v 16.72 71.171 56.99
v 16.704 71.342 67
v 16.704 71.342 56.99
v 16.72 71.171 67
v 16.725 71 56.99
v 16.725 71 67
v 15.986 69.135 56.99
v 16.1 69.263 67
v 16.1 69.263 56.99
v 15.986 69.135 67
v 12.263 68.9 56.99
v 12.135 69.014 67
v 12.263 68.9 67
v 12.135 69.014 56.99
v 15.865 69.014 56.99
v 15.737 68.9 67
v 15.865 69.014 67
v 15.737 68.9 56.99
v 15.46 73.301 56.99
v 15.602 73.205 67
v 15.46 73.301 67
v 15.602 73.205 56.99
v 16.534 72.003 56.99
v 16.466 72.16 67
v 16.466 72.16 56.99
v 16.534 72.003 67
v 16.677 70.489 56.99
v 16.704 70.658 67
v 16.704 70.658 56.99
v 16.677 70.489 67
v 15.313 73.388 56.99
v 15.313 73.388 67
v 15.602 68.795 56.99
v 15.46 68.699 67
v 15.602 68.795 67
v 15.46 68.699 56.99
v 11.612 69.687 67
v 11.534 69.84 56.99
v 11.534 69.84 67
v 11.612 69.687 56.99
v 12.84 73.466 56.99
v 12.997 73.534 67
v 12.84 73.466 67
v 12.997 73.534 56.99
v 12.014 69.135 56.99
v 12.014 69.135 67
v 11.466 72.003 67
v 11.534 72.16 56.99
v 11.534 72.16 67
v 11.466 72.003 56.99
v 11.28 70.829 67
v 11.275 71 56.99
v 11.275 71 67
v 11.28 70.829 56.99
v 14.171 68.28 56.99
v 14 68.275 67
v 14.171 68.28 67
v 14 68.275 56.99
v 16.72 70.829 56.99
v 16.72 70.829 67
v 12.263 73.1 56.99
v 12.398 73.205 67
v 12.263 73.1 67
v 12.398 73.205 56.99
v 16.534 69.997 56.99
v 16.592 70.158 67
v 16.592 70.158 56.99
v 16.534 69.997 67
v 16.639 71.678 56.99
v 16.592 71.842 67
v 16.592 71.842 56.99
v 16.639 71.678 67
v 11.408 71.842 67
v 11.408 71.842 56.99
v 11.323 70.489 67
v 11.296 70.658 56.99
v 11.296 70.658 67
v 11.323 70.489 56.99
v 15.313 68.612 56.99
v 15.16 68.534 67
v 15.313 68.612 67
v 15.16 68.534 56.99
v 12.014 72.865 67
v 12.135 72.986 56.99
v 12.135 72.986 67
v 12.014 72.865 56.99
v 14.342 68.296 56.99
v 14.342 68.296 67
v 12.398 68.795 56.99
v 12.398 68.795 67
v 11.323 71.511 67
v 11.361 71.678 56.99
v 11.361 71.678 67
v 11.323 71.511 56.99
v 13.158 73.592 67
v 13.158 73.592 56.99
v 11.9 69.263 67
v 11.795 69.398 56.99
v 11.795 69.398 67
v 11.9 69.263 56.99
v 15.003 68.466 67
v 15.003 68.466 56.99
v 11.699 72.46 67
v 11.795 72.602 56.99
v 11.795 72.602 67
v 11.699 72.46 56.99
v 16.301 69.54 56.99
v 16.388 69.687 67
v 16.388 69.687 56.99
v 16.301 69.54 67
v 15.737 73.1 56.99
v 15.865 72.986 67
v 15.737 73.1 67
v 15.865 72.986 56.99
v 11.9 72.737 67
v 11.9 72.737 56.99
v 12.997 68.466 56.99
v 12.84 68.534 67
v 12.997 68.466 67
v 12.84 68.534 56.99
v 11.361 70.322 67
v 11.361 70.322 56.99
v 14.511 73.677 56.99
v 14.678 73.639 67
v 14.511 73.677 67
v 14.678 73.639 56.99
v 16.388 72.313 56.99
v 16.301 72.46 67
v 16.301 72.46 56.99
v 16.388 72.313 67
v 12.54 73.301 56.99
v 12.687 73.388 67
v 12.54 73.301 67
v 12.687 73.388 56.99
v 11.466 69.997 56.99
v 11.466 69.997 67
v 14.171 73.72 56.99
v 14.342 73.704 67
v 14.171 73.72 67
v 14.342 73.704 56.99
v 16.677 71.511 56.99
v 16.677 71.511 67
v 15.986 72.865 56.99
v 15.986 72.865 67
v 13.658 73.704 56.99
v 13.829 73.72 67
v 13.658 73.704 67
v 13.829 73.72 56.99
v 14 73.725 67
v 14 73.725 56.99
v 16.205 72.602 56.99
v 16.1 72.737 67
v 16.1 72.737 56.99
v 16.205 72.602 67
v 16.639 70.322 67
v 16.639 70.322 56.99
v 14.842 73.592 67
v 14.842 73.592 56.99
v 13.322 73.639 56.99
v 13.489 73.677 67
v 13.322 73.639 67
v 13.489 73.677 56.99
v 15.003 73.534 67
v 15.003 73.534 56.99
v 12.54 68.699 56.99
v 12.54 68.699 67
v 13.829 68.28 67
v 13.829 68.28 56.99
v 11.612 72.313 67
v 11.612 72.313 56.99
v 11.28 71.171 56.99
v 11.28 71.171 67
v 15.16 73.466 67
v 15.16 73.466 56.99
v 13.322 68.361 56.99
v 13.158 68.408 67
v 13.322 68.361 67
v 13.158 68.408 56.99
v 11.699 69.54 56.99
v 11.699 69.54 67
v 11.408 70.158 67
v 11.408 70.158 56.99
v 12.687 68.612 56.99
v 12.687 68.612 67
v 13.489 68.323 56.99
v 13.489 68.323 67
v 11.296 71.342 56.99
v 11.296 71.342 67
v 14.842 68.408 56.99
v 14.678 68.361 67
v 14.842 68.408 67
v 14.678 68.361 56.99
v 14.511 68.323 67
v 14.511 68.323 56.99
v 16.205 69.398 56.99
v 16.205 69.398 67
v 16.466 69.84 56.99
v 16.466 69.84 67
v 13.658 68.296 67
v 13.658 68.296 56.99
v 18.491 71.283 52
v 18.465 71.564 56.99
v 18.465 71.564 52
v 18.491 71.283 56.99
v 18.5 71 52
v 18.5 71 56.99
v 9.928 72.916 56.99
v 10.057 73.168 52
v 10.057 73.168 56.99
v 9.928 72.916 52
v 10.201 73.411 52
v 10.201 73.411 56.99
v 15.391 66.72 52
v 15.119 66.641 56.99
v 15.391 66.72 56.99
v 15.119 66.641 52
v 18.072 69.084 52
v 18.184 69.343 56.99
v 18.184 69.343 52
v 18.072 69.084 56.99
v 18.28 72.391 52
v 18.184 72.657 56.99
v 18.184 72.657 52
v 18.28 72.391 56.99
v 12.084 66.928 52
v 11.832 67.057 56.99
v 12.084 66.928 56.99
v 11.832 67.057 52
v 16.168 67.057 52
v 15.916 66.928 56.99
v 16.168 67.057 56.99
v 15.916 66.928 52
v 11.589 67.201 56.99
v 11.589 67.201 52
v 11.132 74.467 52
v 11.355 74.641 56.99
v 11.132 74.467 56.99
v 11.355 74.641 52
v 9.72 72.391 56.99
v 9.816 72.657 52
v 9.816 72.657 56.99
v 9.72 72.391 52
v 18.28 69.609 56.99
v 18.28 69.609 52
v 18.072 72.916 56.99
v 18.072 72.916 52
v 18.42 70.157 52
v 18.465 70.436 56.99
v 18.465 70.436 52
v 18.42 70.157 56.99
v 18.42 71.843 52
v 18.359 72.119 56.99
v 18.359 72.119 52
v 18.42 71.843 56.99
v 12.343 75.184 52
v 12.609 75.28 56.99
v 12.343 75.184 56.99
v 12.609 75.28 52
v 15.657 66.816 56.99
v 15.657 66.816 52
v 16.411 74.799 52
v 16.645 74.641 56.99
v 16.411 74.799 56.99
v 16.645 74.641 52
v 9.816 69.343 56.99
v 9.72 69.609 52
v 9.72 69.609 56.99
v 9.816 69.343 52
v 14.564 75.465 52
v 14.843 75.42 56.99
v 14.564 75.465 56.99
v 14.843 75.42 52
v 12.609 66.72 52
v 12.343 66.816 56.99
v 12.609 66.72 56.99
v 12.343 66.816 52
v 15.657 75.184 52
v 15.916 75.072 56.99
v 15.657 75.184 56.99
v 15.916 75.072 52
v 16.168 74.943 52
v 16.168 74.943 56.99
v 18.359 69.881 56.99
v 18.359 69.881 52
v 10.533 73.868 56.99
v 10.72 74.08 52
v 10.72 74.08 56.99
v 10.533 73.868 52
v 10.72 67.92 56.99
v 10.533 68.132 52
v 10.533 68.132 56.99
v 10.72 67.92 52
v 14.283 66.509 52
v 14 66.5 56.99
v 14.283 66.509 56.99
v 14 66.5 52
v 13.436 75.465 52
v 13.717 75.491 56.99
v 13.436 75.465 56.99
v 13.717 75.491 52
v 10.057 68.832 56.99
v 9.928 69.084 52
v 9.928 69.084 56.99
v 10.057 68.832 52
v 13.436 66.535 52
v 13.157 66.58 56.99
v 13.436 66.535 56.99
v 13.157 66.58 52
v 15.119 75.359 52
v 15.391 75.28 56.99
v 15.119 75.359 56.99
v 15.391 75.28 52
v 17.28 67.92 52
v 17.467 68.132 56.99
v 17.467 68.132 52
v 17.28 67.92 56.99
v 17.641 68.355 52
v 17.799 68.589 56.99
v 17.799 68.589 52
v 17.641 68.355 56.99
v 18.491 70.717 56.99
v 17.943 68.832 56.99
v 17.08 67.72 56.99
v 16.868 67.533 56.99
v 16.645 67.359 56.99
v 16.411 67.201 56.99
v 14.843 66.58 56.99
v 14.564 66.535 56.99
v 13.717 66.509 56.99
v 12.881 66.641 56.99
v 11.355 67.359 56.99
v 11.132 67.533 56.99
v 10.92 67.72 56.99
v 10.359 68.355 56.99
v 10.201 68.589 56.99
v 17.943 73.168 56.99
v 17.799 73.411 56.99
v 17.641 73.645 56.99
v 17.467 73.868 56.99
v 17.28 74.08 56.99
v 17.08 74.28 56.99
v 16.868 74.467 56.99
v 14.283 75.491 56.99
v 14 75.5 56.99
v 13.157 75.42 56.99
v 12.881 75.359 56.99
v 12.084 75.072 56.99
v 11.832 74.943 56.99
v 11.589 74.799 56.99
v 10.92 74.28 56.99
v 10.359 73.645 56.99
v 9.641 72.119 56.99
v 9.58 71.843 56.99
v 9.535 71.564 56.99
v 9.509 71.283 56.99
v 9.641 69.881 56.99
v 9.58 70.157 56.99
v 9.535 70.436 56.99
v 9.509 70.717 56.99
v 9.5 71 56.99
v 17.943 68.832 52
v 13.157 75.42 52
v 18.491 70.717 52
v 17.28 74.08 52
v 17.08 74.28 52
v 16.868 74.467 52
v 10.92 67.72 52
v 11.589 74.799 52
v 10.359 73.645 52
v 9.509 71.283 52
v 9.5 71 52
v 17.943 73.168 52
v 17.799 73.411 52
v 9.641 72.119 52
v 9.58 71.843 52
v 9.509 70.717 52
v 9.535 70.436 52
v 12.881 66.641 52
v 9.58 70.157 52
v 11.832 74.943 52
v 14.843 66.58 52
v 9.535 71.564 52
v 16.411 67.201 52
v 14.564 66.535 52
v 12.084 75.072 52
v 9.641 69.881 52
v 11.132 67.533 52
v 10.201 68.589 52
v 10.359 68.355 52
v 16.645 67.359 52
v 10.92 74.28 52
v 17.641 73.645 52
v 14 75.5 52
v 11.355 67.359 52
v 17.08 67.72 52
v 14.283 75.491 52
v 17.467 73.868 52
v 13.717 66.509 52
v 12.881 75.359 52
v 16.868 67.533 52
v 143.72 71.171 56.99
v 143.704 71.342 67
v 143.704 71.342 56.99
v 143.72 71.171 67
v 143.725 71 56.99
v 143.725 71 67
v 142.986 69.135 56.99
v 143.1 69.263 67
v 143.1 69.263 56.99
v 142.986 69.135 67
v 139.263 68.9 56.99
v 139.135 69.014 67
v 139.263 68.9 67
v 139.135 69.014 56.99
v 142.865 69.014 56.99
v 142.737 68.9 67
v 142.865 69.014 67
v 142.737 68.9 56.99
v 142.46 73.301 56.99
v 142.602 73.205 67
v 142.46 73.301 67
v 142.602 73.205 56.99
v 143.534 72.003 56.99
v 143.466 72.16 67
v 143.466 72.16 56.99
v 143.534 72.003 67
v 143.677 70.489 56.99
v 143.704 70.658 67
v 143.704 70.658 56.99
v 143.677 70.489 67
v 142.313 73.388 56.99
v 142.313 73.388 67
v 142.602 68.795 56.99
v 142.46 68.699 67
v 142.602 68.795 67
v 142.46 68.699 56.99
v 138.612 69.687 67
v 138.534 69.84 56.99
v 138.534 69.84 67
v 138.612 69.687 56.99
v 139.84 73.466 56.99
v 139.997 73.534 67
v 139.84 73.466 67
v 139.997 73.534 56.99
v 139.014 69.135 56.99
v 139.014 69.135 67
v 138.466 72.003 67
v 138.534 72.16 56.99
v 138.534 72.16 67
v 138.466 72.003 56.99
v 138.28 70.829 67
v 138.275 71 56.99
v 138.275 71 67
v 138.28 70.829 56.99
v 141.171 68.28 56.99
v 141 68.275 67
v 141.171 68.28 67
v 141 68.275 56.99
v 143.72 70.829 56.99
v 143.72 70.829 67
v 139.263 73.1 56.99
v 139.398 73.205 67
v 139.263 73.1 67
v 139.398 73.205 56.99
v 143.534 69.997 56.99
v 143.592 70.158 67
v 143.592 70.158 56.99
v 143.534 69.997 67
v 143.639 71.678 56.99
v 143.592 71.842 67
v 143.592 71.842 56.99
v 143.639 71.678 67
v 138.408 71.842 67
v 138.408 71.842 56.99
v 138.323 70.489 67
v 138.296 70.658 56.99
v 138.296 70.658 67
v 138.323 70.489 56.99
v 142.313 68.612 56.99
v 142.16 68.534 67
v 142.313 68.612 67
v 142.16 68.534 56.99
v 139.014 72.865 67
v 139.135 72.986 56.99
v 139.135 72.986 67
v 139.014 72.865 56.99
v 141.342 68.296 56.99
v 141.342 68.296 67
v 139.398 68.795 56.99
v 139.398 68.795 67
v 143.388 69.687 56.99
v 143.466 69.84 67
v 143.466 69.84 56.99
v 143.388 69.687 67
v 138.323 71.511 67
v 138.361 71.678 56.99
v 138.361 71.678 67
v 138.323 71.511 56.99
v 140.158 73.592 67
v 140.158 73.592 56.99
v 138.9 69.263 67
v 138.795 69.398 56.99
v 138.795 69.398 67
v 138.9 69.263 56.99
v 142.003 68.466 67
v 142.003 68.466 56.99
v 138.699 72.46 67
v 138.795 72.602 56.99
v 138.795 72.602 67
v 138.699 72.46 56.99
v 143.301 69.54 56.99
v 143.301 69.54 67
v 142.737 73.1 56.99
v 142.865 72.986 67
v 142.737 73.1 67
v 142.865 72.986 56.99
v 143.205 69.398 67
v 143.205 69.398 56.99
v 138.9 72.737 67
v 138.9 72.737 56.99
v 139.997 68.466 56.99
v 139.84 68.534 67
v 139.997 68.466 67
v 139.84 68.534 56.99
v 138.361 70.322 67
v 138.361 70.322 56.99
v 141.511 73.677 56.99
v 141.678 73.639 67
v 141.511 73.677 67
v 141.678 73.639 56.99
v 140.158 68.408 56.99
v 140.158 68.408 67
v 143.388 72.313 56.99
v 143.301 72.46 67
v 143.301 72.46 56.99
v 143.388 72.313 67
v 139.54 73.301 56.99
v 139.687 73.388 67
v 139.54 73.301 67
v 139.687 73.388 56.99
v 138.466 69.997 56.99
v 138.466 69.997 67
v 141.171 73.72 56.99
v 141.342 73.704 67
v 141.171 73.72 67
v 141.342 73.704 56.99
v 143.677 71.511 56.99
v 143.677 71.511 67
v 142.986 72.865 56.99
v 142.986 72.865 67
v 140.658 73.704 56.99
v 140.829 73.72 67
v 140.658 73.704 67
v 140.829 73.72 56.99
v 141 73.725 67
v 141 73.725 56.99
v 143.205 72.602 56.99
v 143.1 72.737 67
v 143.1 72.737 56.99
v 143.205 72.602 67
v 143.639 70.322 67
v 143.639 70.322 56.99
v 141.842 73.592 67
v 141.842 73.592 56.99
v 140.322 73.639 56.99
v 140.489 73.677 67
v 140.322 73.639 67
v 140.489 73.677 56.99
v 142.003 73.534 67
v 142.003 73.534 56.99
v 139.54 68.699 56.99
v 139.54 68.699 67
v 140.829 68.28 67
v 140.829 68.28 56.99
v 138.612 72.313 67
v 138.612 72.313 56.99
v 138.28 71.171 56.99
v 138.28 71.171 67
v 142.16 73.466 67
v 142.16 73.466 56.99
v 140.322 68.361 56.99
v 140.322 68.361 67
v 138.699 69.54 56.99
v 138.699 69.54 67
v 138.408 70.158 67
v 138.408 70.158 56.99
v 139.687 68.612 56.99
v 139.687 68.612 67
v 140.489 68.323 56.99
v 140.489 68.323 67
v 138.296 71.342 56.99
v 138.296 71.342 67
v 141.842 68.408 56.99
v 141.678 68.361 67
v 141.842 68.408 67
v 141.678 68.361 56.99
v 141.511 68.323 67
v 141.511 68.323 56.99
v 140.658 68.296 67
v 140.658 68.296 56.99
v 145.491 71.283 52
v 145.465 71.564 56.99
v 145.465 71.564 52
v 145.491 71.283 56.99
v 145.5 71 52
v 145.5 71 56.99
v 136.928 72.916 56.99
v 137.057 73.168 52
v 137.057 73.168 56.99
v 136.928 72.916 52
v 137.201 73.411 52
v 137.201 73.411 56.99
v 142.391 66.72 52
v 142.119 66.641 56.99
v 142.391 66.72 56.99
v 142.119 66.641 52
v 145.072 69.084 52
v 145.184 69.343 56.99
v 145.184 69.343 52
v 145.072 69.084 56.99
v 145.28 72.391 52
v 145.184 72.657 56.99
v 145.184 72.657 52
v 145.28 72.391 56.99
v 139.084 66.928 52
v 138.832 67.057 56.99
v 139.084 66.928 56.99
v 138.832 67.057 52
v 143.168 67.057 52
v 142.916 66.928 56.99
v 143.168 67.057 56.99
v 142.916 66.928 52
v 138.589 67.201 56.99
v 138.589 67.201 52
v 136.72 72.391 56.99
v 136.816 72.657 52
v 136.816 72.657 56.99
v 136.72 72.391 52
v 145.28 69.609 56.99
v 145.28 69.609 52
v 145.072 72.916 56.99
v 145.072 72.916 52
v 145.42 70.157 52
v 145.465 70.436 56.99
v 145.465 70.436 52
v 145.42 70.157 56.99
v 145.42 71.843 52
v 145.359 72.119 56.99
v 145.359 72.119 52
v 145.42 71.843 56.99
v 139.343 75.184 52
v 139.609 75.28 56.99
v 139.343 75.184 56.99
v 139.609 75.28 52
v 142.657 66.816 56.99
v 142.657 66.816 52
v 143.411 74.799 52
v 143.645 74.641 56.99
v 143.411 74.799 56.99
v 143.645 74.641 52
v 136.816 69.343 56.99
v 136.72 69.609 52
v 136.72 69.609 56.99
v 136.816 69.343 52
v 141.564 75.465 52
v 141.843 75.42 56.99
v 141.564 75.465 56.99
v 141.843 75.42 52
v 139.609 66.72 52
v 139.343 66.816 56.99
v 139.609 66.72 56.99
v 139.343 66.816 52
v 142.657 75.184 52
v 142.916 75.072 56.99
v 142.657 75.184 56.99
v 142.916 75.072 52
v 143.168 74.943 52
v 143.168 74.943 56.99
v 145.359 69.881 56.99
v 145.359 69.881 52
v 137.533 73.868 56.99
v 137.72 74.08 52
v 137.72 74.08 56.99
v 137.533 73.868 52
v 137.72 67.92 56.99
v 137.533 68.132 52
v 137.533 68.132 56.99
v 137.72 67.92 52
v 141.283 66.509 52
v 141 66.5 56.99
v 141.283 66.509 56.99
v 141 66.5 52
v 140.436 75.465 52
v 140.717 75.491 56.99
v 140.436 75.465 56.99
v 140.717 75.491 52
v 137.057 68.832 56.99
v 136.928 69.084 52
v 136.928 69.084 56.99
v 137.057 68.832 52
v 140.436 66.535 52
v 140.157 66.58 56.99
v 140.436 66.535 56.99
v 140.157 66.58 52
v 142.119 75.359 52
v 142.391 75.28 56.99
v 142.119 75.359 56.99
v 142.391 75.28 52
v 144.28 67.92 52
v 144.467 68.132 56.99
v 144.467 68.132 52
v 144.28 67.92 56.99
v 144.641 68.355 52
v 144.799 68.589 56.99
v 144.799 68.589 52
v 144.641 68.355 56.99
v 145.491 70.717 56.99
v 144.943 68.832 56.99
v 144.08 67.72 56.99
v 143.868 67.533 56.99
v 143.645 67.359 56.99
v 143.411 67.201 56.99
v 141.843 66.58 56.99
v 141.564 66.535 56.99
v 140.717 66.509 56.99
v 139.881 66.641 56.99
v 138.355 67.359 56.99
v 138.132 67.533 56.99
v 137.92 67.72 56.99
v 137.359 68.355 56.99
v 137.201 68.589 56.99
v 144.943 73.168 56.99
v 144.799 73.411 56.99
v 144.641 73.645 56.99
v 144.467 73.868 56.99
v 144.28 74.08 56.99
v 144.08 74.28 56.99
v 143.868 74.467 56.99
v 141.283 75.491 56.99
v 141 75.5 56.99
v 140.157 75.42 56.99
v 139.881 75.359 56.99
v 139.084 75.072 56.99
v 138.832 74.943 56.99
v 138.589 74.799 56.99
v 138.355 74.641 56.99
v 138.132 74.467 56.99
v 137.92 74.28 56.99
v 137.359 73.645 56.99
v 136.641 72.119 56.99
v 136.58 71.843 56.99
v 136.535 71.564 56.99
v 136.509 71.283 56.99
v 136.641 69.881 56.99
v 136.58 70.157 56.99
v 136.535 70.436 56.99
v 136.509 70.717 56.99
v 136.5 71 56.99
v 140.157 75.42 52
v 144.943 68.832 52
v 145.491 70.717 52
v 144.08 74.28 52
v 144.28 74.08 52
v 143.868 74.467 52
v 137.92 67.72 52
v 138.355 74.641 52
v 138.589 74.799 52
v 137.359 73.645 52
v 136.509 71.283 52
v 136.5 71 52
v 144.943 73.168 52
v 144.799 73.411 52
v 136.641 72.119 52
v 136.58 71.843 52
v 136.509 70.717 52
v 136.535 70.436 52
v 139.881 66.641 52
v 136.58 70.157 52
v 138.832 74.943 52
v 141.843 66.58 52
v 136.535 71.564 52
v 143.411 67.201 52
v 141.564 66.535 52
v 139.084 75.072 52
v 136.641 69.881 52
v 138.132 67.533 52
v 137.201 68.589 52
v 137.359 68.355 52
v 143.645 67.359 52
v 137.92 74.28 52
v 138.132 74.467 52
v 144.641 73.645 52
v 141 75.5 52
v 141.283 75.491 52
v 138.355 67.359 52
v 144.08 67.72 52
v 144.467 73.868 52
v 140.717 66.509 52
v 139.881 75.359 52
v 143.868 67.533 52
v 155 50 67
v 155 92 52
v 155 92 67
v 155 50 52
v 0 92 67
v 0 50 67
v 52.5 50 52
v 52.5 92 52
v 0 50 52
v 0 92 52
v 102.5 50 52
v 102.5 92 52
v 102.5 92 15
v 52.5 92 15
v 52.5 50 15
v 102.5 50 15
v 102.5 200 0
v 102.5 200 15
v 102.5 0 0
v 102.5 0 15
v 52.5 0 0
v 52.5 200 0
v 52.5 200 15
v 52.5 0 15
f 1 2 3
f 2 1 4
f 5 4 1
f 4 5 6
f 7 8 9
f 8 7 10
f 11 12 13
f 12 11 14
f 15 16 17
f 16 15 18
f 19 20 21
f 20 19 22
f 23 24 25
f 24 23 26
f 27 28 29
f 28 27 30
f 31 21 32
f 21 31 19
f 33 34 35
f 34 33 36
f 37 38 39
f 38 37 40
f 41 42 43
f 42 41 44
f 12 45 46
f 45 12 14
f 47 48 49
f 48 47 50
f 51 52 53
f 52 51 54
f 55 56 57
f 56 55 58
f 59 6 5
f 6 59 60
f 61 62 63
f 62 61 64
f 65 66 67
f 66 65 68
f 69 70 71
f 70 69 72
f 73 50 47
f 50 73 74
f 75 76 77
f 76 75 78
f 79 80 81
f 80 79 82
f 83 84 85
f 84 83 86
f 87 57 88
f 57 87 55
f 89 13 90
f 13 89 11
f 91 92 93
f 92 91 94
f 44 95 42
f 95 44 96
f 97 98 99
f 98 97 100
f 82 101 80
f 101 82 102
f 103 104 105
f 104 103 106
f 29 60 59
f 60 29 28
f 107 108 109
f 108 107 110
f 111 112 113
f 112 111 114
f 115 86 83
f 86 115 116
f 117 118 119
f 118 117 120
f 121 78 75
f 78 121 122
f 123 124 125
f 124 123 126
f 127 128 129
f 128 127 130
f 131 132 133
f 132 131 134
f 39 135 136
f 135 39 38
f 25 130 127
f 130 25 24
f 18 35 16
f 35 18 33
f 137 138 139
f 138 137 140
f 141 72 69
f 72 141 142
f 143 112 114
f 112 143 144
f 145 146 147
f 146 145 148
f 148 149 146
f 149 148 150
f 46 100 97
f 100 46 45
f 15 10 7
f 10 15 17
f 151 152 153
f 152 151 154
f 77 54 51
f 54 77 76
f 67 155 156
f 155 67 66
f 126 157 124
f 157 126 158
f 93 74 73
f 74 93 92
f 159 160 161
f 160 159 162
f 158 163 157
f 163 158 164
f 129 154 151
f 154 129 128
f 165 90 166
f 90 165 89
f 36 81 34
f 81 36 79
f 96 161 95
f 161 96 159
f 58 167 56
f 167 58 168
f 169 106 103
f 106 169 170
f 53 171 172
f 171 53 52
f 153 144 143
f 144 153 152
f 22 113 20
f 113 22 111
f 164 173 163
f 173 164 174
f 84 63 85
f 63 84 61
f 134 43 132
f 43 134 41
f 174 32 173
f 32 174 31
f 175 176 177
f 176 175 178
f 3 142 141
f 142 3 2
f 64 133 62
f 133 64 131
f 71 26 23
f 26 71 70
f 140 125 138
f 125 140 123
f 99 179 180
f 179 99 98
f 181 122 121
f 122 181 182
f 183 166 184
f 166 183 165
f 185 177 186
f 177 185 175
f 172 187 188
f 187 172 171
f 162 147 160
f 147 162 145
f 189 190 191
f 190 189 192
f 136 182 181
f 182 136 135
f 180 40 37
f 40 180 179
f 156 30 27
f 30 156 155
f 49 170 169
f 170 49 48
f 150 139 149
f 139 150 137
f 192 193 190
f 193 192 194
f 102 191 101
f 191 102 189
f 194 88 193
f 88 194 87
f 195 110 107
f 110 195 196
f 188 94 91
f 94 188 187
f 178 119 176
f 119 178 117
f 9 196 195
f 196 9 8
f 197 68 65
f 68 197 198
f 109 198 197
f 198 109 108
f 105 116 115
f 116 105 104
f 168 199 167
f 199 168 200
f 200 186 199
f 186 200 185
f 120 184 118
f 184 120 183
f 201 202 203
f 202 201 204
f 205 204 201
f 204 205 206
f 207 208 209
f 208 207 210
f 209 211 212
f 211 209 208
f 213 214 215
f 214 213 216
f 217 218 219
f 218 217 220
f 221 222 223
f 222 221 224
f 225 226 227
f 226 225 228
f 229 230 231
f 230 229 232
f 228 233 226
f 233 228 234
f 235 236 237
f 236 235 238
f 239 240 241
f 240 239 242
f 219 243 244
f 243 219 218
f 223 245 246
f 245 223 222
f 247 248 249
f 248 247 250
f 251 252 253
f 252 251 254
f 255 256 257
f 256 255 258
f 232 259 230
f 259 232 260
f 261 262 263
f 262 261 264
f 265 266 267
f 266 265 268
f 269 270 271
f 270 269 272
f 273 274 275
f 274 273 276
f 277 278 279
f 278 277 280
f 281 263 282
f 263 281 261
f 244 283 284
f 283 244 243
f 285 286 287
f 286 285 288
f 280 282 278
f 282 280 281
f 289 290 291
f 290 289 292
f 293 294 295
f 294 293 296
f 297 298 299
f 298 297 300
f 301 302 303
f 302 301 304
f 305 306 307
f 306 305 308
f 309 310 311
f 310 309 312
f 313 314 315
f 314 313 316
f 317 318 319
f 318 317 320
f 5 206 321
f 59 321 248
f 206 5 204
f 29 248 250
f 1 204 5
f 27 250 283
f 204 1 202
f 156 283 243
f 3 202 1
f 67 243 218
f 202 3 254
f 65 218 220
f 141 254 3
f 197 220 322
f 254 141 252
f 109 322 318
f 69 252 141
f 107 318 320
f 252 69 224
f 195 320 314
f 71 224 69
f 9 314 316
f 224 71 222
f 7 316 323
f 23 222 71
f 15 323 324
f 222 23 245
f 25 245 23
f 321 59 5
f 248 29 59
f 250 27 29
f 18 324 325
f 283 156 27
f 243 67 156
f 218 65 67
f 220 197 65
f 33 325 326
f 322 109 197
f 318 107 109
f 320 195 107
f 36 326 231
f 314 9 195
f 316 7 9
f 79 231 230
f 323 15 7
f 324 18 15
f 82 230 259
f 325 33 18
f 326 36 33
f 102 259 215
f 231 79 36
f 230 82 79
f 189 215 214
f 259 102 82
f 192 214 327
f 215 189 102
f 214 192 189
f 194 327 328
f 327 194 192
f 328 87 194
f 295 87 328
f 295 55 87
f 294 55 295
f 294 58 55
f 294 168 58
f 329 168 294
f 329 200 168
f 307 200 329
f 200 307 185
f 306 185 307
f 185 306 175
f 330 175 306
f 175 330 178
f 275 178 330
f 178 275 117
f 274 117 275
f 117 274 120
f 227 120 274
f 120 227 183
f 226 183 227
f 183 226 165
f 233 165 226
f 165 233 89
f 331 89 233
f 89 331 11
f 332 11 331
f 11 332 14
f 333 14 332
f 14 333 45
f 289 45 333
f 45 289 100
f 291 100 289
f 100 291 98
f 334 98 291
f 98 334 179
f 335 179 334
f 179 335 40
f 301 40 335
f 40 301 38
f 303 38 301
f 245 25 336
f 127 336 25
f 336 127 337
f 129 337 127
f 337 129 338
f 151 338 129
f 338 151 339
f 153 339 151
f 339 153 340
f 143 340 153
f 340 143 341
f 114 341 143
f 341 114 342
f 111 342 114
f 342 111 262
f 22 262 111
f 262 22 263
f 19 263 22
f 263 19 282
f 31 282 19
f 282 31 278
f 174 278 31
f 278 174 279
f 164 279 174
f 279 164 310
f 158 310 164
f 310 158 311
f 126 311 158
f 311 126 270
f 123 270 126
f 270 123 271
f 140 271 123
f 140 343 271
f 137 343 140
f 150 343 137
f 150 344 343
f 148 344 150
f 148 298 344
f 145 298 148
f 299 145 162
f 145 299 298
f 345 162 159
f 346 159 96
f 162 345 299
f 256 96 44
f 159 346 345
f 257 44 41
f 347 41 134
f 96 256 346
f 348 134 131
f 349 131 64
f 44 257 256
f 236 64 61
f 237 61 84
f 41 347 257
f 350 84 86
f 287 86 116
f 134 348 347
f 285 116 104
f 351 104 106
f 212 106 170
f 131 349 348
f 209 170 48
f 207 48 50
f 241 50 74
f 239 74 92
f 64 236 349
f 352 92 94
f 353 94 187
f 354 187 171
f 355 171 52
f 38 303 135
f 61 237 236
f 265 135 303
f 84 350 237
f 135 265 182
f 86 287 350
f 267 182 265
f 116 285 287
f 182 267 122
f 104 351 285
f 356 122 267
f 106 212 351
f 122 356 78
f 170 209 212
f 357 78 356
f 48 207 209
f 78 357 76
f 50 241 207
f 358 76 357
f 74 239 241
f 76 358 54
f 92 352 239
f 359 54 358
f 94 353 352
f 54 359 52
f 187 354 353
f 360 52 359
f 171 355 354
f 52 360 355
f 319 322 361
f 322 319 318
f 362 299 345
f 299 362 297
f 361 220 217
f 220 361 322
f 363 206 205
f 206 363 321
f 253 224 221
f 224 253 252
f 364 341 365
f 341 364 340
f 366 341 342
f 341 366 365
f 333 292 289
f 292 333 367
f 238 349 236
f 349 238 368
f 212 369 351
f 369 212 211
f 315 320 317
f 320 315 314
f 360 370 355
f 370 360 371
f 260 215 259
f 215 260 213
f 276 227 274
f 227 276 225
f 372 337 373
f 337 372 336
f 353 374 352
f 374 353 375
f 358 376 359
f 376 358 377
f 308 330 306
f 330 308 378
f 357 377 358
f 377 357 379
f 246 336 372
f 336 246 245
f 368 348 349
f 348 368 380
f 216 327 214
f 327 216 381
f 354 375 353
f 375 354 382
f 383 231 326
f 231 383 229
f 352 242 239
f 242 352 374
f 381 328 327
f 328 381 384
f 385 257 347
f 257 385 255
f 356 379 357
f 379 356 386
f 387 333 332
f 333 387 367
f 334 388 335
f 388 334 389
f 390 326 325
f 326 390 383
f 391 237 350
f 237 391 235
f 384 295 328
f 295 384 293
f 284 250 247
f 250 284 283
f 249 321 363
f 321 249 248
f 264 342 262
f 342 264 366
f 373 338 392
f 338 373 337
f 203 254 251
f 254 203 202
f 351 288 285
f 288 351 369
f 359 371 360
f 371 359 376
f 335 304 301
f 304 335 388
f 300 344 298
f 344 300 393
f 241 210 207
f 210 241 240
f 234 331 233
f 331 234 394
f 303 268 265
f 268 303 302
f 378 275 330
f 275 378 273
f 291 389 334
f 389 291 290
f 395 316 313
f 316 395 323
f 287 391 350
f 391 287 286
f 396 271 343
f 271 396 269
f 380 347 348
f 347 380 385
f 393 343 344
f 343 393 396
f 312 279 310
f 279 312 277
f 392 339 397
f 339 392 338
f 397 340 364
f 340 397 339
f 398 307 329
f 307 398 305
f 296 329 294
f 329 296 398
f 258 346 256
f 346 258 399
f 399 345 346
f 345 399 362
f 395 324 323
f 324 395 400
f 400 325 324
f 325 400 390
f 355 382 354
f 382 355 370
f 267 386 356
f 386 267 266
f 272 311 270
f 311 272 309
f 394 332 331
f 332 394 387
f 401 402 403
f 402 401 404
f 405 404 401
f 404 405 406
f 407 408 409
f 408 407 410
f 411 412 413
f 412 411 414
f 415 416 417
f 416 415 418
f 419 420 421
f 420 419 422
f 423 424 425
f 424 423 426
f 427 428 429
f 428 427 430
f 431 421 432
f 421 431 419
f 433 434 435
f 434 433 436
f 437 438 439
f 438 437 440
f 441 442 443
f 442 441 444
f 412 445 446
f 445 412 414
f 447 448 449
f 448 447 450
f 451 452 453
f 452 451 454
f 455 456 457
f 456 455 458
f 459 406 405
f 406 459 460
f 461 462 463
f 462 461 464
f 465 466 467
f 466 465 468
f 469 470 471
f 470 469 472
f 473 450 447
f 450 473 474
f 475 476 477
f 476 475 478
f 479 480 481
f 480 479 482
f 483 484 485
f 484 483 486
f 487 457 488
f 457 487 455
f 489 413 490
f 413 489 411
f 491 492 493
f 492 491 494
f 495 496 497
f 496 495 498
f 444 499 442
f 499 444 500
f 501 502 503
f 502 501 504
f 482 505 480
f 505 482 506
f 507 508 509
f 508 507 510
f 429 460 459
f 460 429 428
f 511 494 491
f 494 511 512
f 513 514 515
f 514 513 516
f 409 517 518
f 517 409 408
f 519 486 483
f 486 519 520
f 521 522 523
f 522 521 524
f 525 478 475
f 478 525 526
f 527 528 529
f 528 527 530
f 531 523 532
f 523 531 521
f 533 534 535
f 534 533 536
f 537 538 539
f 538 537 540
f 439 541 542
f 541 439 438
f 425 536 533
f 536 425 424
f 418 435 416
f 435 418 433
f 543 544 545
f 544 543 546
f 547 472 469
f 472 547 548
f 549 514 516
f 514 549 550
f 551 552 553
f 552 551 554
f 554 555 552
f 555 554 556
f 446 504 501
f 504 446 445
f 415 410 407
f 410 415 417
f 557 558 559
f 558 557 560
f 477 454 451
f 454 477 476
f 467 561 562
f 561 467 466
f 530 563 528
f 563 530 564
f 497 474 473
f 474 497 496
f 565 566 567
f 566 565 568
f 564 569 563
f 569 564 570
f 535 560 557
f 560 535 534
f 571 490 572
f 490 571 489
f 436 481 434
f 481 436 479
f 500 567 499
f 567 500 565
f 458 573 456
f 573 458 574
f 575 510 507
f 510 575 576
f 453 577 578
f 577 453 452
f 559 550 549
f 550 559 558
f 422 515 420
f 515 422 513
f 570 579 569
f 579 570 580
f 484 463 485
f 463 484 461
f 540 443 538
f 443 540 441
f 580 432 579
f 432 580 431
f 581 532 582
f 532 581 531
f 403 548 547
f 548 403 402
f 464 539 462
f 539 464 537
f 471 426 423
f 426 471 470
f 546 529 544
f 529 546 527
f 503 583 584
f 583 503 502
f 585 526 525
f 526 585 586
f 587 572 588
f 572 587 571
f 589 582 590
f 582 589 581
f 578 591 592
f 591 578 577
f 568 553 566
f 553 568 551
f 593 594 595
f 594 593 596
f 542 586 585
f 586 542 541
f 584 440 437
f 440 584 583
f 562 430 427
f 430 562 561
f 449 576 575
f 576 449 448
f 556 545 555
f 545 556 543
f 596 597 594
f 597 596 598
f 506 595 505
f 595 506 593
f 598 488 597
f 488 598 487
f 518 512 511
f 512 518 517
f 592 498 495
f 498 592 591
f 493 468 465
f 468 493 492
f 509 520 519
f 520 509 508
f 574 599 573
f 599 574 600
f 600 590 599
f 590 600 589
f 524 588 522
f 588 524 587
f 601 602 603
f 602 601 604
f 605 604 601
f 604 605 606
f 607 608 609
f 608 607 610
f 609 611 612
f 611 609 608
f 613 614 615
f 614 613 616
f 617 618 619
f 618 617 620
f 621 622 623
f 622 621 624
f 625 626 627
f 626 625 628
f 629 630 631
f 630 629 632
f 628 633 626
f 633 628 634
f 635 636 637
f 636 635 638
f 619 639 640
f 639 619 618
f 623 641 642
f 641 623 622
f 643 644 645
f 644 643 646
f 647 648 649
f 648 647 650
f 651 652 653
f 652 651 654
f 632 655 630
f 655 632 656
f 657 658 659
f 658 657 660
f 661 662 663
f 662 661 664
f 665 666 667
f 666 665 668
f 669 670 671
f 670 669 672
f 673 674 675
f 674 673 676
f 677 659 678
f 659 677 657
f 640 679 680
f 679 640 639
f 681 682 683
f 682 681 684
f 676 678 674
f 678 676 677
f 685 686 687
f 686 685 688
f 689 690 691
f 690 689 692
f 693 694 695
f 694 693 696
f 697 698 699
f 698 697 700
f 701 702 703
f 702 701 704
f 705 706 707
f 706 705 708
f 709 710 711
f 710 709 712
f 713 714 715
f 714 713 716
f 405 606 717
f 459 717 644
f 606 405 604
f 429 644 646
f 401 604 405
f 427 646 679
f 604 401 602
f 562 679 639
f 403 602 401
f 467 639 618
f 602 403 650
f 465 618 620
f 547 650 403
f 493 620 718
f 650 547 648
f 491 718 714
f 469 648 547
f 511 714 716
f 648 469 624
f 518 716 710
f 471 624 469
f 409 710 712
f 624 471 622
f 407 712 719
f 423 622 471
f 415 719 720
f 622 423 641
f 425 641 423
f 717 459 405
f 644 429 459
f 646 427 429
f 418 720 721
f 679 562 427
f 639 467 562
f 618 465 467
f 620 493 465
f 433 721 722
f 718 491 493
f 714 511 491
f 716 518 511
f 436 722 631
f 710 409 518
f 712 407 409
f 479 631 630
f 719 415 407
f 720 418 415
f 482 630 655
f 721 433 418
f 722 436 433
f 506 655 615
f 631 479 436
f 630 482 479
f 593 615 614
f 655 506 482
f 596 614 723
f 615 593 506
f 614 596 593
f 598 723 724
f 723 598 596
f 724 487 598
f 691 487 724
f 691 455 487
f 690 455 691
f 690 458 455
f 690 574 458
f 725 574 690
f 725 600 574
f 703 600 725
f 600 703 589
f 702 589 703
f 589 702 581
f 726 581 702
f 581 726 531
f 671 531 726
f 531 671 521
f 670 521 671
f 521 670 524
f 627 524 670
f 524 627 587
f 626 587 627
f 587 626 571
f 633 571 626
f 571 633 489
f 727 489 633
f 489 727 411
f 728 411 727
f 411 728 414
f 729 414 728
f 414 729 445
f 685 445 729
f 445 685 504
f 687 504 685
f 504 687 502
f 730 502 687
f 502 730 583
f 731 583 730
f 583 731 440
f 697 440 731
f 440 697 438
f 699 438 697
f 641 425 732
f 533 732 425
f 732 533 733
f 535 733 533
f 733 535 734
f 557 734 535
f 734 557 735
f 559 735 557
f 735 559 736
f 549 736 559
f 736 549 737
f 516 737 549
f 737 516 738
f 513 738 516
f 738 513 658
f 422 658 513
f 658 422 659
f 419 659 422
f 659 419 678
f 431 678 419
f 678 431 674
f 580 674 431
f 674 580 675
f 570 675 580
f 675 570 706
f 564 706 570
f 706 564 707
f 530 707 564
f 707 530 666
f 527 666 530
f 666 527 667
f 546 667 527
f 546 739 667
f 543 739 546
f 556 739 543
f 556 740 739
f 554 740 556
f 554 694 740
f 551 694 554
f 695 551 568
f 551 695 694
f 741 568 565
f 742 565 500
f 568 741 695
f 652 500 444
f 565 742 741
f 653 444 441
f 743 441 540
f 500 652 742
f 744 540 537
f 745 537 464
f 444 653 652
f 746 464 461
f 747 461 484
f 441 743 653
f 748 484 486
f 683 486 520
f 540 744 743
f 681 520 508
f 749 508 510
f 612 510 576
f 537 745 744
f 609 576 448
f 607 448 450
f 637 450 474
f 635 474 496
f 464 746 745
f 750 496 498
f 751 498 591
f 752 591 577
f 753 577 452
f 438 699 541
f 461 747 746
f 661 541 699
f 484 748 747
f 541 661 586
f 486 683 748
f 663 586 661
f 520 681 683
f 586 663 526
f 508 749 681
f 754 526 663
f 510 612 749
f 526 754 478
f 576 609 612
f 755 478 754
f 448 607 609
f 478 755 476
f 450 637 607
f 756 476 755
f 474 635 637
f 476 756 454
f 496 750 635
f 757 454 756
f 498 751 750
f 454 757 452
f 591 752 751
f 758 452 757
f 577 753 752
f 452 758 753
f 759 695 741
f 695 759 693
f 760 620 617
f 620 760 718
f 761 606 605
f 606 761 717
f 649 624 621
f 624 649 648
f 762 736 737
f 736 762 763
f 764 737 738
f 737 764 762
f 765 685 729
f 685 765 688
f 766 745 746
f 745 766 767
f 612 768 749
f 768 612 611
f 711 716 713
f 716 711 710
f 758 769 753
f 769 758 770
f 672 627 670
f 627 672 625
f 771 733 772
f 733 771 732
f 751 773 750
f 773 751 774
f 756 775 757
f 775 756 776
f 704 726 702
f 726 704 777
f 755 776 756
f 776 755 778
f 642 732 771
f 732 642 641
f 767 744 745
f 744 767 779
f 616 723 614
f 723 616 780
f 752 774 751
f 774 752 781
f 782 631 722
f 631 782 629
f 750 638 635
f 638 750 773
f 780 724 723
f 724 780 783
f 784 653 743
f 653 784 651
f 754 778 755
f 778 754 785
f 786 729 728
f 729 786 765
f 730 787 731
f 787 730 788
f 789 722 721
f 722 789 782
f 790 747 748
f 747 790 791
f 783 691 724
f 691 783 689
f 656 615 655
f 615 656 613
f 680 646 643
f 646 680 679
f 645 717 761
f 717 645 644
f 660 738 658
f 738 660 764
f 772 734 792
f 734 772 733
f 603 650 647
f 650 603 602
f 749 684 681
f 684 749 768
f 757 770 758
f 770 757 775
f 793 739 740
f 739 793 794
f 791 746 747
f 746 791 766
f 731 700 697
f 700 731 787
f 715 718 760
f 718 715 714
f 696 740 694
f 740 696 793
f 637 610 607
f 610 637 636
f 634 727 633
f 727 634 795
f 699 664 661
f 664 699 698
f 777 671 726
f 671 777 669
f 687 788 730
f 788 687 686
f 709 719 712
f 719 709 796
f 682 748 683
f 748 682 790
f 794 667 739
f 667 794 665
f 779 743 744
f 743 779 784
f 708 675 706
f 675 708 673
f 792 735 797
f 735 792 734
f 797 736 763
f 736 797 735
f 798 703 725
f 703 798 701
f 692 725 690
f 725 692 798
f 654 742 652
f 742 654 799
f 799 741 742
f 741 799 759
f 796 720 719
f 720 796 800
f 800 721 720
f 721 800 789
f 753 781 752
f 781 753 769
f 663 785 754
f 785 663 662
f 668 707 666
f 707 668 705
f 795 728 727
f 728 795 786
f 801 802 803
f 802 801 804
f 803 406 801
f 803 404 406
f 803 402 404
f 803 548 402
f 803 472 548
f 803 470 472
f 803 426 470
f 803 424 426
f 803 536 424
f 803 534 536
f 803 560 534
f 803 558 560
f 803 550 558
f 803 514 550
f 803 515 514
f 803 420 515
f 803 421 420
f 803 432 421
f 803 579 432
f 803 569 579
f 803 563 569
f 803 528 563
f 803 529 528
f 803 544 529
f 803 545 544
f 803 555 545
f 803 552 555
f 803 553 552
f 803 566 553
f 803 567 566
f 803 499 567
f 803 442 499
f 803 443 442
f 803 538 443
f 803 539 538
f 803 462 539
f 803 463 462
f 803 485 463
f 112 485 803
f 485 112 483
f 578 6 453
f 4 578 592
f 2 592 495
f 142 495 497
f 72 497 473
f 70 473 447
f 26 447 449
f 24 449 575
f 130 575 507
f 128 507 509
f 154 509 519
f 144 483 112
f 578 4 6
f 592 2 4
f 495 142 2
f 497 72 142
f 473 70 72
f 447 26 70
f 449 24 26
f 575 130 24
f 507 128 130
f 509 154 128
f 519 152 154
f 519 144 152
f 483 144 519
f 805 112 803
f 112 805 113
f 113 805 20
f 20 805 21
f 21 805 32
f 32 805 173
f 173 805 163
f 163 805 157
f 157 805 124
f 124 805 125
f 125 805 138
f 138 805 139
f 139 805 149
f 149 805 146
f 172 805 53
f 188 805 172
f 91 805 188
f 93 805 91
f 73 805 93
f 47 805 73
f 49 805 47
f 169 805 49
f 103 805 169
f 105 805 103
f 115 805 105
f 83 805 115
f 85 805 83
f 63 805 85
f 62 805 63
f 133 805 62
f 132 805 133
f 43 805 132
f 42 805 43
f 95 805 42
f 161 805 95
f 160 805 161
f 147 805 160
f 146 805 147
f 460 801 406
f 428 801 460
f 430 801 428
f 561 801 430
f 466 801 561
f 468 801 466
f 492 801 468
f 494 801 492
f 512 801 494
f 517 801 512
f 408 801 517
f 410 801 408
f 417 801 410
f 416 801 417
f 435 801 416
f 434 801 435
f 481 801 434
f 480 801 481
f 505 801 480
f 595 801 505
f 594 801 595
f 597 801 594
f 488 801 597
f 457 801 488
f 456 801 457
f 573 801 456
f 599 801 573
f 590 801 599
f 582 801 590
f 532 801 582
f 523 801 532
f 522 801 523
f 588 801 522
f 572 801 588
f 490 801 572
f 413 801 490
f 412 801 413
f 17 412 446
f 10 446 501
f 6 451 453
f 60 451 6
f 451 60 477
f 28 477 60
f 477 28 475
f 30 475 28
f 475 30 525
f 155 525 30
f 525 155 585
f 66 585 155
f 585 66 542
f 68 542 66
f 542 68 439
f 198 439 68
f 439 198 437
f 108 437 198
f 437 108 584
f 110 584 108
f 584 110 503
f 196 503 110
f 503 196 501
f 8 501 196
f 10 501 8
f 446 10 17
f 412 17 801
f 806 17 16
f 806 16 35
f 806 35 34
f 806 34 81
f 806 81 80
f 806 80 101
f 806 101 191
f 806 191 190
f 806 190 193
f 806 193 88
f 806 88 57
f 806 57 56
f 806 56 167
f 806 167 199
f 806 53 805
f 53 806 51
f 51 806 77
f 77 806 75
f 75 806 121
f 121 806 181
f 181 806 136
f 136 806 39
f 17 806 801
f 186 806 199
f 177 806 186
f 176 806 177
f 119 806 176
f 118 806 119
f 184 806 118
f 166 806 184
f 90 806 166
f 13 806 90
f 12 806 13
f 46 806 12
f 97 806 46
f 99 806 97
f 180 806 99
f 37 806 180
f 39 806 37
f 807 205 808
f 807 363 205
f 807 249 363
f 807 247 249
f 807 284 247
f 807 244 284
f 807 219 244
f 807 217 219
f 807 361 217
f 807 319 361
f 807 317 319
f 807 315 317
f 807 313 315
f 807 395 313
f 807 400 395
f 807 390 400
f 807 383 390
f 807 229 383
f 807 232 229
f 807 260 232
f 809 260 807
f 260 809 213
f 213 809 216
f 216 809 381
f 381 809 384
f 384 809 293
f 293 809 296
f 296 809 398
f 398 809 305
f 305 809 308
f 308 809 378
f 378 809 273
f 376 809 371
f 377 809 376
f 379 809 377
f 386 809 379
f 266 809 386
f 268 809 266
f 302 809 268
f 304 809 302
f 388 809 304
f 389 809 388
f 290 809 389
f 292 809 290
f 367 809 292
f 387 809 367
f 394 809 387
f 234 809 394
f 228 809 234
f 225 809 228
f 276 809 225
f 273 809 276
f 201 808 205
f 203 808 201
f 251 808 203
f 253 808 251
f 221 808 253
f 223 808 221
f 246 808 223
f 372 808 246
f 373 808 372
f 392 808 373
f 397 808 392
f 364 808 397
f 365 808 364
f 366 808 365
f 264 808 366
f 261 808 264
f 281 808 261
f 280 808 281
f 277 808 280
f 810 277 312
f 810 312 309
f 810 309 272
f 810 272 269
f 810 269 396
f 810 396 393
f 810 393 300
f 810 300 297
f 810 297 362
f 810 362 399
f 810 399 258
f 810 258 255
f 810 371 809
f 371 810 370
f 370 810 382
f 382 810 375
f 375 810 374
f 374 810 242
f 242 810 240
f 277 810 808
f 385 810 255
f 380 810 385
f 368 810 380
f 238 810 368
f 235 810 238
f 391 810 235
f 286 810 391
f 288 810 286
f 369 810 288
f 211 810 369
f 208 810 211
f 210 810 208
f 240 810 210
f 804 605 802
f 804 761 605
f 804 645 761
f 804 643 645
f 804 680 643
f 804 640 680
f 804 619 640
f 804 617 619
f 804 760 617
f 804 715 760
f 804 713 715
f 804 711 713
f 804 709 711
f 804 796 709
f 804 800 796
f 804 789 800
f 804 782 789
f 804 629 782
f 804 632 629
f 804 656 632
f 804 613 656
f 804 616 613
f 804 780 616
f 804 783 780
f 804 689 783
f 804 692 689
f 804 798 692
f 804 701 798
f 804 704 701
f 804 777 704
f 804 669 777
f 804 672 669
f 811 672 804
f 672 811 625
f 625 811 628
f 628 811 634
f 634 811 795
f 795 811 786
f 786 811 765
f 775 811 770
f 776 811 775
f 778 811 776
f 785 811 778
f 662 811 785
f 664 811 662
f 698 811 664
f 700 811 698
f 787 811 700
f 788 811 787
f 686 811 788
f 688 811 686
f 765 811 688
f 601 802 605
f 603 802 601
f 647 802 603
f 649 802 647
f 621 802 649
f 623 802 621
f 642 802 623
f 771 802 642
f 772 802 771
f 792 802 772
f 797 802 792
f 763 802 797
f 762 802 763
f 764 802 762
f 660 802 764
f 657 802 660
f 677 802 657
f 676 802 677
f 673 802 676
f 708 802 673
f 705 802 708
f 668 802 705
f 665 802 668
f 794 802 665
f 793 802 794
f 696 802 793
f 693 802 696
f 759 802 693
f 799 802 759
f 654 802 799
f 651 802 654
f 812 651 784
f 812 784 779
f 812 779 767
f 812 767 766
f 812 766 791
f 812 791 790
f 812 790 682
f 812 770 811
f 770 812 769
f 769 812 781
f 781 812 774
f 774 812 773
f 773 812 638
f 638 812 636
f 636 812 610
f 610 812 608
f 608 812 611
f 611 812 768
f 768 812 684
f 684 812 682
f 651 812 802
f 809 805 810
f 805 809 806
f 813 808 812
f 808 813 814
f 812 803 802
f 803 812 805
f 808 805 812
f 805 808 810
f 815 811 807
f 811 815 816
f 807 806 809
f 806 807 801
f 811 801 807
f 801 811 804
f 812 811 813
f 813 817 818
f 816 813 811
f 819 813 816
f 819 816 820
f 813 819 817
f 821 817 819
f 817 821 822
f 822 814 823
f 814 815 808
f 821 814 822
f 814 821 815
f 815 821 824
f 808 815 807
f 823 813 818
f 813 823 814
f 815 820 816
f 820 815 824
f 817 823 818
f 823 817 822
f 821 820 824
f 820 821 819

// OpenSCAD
overall_x = 155;
mountbar_z = 15;

clearance = 52;

foot_x = 50;
foot_z = 15;

holepitch = 127;

$fn=100;
union()
{
  translate([0,50,foot_z+clearance-mountbar_z]) difference()
  {
    cube([overall_x, 42, mountbar_z]);
    for(x=[0:holepitch:holepitch]) translate([(overall_x-holepitch)/2+x,42/2,-0.01])
    {
      cylinder(r=5.45/2, h=100);
      cylinder(r=9/2, h=5);
    }
  }
  #translate([overall_x/2-foot_x/2, 50, 0]) cube([foot_x, 42,  clearance]);
  translate([overall_x/2-foot_x/2, 0, 0]) cube([foot_x, 200, foot_z]);
}
